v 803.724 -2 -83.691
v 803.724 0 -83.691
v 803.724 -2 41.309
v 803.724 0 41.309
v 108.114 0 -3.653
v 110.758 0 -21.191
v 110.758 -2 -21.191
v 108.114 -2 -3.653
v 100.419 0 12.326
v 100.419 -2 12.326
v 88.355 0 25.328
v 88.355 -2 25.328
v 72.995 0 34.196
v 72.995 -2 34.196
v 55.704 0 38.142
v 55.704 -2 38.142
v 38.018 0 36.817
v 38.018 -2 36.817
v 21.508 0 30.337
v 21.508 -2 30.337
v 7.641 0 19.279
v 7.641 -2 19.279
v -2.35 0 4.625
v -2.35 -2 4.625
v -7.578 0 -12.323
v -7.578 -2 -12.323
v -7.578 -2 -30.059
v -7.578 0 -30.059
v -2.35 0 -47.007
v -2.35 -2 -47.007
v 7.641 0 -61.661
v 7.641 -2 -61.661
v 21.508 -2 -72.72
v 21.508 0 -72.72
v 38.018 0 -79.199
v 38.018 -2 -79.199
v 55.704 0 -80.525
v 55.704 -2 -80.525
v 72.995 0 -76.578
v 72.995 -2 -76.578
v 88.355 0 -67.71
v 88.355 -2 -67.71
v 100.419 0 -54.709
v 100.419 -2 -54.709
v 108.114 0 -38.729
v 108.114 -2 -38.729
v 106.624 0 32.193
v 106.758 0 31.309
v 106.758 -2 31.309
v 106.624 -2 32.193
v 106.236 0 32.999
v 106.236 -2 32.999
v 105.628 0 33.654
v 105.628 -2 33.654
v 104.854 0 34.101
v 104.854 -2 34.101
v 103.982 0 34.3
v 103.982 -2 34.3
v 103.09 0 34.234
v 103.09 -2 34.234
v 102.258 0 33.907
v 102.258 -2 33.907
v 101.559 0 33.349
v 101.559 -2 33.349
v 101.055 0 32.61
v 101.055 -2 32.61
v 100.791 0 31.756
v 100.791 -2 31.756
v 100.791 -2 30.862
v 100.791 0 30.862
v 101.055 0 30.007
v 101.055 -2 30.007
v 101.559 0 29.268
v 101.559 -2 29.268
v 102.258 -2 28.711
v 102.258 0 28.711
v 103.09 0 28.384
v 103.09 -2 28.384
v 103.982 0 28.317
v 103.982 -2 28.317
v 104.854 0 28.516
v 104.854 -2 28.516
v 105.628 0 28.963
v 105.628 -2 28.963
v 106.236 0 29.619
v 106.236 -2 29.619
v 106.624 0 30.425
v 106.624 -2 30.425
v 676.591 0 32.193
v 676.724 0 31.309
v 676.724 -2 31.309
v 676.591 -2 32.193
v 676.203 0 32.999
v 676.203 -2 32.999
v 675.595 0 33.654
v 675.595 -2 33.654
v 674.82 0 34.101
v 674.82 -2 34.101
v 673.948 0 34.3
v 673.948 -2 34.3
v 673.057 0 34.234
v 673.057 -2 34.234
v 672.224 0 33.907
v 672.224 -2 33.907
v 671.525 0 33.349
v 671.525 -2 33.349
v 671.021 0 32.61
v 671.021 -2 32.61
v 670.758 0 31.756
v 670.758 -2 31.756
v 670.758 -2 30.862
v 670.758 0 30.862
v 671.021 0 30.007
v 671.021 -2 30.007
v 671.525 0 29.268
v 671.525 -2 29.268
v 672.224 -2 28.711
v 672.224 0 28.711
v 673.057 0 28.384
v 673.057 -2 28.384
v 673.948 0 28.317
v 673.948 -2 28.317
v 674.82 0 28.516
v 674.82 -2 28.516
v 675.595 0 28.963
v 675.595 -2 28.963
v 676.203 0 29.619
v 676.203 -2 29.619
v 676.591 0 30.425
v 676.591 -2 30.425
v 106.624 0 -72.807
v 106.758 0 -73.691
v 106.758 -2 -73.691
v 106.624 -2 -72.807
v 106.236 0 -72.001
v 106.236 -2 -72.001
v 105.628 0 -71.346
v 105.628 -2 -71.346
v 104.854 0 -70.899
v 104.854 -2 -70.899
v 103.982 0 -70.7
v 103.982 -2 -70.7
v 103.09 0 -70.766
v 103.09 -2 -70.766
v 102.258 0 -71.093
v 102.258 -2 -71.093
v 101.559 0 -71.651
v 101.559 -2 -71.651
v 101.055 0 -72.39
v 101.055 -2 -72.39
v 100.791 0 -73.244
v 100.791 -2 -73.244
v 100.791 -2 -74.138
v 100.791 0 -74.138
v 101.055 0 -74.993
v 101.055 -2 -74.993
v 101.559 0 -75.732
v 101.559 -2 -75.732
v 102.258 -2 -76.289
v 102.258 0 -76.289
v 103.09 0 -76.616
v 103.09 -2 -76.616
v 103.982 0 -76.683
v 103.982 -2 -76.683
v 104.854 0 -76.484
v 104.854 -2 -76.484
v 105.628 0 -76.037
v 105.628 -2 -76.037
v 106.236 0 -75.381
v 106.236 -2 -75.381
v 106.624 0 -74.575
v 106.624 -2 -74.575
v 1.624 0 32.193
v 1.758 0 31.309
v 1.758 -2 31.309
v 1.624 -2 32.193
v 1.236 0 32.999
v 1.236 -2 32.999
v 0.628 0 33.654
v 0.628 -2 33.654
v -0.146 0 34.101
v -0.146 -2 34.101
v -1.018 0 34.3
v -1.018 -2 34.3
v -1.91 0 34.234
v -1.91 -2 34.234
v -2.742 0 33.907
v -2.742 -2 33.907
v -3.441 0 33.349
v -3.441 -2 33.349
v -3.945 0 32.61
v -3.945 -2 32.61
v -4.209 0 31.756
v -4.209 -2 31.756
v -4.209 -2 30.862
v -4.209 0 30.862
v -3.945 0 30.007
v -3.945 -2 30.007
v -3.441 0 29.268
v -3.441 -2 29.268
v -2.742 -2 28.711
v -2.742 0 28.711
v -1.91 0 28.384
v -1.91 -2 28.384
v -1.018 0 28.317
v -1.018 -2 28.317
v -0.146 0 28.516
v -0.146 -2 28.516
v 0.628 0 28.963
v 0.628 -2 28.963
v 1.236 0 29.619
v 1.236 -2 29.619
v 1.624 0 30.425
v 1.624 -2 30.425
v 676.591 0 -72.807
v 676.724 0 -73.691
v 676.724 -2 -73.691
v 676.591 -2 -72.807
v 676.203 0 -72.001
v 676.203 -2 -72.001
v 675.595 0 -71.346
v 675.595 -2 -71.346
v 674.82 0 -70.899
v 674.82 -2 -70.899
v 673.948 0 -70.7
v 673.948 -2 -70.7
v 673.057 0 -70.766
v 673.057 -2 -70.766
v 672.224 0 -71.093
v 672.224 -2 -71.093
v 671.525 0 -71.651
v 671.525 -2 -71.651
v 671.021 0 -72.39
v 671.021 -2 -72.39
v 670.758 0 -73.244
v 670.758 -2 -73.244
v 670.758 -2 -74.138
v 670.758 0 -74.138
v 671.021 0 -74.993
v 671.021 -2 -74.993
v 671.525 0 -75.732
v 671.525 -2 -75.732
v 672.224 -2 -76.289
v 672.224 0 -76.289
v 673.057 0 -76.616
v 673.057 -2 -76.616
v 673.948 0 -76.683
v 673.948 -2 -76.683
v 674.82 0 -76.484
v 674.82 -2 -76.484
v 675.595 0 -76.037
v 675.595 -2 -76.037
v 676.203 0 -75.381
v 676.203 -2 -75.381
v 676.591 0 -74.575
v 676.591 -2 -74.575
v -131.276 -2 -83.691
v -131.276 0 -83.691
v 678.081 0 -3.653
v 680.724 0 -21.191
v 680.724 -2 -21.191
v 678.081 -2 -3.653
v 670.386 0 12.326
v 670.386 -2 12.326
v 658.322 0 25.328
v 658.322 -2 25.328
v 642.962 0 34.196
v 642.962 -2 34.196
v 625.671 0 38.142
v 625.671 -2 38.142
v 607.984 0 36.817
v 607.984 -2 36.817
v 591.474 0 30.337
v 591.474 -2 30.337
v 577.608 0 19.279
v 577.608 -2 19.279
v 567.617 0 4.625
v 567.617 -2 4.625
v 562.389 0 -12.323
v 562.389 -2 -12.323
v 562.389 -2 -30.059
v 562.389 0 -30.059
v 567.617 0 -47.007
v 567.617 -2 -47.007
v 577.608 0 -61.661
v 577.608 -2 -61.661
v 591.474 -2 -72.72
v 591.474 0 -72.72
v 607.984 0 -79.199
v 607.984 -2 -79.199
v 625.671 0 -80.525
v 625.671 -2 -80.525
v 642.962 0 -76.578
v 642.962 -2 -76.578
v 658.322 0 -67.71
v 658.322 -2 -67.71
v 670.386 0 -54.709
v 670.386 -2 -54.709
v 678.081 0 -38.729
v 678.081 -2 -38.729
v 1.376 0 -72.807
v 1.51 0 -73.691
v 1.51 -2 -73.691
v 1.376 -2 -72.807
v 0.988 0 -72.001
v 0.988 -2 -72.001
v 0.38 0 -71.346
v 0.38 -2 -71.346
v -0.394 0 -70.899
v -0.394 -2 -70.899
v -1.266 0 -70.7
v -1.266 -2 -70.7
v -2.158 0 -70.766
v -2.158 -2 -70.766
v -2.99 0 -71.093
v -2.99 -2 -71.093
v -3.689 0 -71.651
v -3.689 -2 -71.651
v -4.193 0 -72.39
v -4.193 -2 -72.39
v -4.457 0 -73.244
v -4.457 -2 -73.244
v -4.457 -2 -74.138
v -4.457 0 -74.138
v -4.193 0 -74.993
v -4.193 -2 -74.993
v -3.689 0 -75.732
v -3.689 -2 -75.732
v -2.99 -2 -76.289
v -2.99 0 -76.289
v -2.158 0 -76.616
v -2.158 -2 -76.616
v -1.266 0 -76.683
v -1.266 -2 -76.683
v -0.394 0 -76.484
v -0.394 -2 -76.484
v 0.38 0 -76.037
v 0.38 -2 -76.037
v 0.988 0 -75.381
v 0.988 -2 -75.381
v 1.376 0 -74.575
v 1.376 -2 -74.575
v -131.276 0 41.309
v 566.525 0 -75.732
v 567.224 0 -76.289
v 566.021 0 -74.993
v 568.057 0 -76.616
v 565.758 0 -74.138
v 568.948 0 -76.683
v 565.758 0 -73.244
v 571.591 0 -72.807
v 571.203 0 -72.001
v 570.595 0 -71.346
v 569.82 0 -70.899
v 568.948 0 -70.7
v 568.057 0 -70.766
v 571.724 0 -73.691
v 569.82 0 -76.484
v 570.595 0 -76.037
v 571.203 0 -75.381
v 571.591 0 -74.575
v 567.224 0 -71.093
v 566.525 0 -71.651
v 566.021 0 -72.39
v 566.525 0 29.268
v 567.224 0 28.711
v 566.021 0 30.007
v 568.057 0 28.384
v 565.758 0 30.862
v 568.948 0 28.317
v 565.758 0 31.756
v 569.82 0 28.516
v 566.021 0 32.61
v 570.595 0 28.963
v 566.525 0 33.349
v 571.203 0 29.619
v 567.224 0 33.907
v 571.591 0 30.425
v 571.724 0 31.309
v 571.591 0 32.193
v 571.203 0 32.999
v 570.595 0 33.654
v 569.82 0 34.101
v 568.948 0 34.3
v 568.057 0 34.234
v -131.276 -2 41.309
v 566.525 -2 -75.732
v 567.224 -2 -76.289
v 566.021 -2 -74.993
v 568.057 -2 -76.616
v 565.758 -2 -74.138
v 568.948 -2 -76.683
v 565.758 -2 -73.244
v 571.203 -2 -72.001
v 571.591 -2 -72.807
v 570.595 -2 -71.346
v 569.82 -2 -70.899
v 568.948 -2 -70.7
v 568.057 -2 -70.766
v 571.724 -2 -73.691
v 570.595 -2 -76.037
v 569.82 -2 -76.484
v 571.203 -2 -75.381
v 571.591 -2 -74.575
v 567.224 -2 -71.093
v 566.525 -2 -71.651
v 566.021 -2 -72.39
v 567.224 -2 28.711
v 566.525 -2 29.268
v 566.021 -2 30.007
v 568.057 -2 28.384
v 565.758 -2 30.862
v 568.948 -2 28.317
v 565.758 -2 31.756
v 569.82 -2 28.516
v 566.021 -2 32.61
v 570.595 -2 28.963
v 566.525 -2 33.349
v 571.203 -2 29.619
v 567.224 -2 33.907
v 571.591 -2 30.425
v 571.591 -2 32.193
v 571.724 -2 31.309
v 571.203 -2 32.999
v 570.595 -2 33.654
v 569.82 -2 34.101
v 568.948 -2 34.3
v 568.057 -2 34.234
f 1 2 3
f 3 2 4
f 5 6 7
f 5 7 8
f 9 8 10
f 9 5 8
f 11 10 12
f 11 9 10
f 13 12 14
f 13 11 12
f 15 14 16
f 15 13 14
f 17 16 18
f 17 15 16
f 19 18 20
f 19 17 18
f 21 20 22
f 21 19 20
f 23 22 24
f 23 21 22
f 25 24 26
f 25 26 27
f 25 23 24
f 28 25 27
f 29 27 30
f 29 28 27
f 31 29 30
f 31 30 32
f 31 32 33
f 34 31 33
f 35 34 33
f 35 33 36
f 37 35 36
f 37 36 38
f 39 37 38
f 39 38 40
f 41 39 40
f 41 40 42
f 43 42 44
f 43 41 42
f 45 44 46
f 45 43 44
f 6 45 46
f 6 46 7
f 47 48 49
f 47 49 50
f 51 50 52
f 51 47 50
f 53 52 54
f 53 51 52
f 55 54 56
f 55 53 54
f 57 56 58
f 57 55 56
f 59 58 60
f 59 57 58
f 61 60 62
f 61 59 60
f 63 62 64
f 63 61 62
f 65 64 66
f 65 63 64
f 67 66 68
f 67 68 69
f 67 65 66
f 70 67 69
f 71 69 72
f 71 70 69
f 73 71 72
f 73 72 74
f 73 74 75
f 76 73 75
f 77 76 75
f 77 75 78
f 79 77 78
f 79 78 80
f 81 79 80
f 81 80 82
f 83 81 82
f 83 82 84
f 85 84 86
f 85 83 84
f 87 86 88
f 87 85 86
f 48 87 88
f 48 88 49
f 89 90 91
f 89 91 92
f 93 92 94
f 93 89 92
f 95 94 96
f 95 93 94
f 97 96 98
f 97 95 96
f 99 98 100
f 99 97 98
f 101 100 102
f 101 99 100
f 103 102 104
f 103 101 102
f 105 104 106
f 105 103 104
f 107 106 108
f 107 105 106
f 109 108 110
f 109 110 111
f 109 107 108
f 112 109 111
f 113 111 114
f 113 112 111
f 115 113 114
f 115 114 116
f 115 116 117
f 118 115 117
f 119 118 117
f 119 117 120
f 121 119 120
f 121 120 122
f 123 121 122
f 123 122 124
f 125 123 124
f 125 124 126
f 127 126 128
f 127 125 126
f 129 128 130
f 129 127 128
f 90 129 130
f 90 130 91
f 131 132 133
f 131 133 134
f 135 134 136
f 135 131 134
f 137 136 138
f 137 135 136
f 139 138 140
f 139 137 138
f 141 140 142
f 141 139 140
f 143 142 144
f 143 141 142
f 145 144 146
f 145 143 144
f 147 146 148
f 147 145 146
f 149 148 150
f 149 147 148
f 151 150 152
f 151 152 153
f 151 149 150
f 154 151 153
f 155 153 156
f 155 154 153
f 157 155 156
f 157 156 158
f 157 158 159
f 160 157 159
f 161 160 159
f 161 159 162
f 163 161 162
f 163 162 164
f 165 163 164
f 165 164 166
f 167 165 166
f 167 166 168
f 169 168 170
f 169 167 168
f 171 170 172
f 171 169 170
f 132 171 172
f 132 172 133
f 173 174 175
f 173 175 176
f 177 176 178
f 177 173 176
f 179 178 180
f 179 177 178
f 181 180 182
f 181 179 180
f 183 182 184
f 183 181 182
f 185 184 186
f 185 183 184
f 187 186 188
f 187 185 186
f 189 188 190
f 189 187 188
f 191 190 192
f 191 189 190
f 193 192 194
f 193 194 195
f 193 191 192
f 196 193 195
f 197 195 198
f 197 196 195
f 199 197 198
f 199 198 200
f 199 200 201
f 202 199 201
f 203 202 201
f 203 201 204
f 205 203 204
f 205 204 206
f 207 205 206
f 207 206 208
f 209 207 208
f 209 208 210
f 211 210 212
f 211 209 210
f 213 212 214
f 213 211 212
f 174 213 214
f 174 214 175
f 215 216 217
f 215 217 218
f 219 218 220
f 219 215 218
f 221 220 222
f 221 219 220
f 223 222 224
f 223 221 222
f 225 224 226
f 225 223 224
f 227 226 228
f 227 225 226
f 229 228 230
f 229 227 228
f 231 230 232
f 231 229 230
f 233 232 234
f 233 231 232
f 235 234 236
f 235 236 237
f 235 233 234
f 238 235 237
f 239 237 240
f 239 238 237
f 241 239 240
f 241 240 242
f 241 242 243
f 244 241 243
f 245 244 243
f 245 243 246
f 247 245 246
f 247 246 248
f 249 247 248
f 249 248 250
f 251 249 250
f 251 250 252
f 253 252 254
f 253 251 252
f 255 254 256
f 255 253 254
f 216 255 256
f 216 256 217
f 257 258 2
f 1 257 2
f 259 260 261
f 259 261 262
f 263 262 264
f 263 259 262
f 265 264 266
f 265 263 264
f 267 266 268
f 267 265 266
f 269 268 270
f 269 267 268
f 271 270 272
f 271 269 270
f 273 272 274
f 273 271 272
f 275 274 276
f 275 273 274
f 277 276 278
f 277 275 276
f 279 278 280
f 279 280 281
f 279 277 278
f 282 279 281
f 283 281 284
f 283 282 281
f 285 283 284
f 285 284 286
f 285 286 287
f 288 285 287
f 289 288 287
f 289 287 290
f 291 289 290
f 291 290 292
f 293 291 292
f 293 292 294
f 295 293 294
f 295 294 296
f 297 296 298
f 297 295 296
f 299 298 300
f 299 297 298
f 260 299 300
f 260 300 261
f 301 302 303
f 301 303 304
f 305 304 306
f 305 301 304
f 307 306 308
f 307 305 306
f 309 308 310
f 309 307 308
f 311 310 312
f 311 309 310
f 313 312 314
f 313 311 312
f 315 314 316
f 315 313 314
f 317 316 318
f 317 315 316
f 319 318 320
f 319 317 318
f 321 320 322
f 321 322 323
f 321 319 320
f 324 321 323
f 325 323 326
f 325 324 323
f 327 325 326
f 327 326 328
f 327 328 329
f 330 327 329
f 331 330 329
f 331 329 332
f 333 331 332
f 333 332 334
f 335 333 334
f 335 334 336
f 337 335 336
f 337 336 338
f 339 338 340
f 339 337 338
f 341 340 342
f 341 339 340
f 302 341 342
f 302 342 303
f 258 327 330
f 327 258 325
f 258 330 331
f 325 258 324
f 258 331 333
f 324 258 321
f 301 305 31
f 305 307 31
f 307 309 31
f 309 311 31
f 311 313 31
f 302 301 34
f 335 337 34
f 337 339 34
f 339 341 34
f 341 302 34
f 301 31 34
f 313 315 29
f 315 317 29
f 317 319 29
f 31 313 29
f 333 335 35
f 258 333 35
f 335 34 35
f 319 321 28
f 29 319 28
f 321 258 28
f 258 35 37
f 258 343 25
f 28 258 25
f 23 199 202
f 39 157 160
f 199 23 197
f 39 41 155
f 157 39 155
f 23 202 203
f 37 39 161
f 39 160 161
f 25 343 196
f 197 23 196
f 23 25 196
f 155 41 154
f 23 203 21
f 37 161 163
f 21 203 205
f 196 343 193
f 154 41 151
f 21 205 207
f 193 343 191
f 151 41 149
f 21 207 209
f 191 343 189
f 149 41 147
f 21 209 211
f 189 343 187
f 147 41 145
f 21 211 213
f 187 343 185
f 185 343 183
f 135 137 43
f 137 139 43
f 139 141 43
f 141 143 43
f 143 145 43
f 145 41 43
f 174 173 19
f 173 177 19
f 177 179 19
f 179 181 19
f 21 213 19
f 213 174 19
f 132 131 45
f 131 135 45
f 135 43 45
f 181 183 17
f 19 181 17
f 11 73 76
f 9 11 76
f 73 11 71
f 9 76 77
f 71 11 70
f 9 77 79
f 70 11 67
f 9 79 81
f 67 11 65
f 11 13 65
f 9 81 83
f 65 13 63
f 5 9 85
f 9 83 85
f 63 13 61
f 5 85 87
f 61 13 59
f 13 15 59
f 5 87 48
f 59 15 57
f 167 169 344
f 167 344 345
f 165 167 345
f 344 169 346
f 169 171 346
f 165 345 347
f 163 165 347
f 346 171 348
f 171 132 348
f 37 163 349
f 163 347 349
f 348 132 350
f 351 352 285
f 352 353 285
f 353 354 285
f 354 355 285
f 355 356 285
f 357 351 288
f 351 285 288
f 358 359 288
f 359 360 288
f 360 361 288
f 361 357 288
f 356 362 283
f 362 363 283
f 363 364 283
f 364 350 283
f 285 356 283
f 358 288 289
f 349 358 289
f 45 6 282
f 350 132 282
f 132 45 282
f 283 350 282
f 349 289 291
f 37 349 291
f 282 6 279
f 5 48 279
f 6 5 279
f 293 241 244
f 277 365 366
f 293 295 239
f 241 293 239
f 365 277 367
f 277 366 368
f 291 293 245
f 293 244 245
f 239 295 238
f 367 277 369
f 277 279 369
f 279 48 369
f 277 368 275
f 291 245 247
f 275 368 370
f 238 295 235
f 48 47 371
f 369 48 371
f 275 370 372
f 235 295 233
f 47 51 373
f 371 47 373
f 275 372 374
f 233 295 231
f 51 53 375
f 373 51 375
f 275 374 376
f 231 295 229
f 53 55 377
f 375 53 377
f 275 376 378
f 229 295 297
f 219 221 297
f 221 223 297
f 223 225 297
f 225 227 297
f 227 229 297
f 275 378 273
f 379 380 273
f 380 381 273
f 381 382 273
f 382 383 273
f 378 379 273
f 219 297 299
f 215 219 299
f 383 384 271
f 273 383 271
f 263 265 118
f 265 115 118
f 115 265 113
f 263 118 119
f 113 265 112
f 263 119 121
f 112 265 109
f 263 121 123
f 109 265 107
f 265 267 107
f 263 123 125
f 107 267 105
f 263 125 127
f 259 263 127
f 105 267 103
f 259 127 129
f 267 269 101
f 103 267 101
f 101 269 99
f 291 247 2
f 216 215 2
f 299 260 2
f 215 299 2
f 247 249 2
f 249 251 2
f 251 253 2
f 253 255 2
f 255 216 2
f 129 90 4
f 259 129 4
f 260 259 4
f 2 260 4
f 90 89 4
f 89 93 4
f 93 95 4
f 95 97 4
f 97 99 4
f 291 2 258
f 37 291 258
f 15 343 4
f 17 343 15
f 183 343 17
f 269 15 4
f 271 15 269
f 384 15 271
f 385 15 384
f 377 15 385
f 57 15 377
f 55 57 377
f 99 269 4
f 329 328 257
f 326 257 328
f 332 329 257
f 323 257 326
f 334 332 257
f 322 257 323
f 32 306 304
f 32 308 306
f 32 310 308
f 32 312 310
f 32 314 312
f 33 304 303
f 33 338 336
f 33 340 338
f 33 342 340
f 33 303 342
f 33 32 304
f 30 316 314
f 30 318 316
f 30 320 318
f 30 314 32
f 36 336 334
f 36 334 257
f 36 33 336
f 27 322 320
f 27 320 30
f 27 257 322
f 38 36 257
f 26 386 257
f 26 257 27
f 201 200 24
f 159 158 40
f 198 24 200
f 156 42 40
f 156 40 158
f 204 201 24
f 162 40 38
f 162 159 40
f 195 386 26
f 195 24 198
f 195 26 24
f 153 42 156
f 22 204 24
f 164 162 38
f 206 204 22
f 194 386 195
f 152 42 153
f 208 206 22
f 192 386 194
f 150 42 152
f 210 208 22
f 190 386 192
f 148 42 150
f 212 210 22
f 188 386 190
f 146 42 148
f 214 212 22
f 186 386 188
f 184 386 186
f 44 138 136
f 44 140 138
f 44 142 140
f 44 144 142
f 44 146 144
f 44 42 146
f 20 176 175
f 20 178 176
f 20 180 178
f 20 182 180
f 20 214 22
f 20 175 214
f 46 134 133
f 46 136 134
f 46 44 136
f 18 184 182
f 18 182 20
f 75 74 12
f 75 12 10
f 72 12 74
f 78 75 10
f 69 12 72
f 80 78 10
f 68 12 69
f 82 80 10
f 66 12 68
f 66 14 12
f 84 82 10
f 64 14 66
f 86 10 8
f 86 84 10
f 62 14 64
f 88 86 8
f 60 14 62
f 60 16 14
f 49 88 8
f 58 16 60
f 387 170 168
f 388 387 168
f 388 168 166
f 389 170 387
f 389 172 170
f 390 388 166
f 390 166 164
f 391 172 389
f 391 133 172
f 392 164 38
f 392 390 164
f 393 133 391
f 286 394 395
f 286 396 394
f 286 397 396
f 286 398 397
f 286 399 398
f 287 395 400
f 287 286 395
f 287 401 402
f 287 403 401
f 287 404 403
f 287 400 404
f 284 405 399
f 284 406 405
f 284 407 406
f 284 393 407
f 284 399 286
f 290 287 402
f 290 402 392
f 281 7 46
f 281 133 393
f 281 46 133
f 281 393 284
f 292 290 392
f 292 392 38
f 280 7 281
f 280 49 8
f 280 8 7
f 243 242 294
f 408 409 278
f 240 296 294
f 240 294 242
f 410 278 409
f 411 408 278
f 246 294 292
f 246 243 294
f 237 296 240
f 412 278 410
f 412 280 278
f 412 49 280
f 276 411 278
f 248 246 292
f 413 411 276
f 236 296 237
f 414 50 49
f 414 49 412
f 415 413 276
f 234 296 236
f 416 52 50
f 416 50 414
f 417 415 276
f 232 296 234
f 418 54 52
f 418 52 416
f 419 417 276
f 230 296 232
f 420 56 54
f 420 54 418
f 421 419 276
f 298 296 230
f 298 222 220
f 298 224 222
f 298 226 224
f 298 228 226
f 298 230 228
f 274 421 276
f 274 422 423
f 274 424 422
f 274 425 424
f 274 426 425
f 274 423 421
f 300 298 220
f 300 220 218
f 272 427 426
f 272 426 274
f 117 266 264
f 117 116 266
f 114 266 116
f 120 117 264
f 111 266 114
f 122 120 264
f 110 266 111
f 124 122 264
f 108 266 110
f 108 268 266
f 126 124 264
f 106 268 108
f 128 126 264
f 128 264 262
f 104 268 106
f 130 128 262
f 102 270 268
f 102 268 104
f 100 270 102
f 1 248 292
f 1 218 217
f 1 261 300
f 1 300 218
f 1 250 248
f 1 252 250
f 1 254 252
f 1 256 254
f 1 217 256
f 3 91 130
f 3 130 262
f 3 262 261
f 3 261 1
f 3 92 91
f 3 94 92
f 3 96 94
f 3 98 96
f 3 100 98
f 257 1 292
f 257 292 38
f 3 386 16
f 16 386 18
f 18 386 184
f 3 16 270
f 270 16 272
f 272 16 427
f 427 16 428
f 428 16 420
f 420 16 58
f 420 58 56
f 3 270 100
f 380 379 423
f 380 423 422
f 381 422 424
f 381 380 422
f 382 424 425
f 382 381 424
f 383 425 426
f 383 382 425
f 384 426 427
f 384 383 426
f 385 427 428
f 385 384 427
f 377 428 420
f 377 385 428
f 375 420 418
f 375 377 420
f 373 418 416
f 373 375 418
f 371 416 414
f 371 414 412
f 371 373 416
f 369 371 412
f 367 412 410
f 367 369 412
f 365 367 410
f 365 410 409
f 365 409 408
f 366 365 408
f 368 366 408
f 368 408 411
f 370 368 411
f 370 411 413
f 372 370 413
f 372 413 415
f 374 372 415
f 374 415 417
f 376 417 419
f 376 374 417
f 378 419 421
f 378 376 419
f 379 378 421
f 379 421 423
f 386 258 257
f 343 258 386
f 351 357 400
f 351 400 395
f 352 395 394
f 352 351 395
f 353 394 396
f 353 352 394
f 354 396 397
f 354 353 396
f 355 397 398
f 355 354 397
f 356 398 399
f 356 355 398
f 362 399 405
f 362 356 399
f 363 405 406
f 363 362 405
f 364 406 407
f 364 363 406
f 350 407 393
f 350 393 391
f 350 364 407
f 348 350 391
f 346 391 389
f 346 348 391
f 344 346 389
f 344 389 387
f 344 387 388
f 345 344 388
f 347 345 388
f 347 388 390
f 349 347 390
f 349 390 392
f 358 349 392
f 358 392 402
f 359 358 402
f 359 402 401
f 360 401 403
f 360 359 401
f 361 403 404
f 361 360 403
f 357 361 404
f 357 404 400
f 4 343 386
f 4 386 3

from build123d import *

# Parameters (mm, degrees)
F0_W     = 935
F0_H     = 125
F0_R     = 3
F0_R_2   = 59.5
F1_DEPTH = 2


with BuildPart() as f1:
    # F0 (on Front) → F1 (new body)
    with BuildSketch(Plane.XZ):
        with Locations((336.224301, -21.191215)):
            Rectangle(F0_W, F0_H)
        with Locations((-1.490244, -73.691215)):
            Circle(F0_R, mode=Mode.SUBTRACT)
        with Locations((103.757686, -73.691215)):
            Circle(F0_R, mode=Mode.SUBTRACT)
        with Locations((568.724301, -73.691215)):
            Circle(F0_R, mode=Mode.SUBTRACT)
        with Locations((673.724301, -73.691215)):
            Circle(F0_R, mode=Mode.SUBTRACT)
        with Locations((51.257686, -21.191215)):
            Circle(F0_R_2, mode=Mode.SUBTRACT)
        with Locations((-1.242314, 31.308785)):
            Circle(F0_R, mode=Mode.SUBTRACT)
        with Locations((103.757686, 31.308785)):
            Circle(F0_R, mode=Mode.SUBTRACT)
        with Locations((621.224301, -21.191215)):
            Circle(F0_R_2, mode=Mode.SUBTRACT)
        with Locations((568.724301, 31.308785)):
            Circle(F0_R, mode=Mode.SUBTRACT)
        with Locations((673.724301, 31.308785)):
            Circle(F0_R, mode=Mode.SUBTRACT)
    extrude(amount=F1_DEPTH)


solid = f1.part
